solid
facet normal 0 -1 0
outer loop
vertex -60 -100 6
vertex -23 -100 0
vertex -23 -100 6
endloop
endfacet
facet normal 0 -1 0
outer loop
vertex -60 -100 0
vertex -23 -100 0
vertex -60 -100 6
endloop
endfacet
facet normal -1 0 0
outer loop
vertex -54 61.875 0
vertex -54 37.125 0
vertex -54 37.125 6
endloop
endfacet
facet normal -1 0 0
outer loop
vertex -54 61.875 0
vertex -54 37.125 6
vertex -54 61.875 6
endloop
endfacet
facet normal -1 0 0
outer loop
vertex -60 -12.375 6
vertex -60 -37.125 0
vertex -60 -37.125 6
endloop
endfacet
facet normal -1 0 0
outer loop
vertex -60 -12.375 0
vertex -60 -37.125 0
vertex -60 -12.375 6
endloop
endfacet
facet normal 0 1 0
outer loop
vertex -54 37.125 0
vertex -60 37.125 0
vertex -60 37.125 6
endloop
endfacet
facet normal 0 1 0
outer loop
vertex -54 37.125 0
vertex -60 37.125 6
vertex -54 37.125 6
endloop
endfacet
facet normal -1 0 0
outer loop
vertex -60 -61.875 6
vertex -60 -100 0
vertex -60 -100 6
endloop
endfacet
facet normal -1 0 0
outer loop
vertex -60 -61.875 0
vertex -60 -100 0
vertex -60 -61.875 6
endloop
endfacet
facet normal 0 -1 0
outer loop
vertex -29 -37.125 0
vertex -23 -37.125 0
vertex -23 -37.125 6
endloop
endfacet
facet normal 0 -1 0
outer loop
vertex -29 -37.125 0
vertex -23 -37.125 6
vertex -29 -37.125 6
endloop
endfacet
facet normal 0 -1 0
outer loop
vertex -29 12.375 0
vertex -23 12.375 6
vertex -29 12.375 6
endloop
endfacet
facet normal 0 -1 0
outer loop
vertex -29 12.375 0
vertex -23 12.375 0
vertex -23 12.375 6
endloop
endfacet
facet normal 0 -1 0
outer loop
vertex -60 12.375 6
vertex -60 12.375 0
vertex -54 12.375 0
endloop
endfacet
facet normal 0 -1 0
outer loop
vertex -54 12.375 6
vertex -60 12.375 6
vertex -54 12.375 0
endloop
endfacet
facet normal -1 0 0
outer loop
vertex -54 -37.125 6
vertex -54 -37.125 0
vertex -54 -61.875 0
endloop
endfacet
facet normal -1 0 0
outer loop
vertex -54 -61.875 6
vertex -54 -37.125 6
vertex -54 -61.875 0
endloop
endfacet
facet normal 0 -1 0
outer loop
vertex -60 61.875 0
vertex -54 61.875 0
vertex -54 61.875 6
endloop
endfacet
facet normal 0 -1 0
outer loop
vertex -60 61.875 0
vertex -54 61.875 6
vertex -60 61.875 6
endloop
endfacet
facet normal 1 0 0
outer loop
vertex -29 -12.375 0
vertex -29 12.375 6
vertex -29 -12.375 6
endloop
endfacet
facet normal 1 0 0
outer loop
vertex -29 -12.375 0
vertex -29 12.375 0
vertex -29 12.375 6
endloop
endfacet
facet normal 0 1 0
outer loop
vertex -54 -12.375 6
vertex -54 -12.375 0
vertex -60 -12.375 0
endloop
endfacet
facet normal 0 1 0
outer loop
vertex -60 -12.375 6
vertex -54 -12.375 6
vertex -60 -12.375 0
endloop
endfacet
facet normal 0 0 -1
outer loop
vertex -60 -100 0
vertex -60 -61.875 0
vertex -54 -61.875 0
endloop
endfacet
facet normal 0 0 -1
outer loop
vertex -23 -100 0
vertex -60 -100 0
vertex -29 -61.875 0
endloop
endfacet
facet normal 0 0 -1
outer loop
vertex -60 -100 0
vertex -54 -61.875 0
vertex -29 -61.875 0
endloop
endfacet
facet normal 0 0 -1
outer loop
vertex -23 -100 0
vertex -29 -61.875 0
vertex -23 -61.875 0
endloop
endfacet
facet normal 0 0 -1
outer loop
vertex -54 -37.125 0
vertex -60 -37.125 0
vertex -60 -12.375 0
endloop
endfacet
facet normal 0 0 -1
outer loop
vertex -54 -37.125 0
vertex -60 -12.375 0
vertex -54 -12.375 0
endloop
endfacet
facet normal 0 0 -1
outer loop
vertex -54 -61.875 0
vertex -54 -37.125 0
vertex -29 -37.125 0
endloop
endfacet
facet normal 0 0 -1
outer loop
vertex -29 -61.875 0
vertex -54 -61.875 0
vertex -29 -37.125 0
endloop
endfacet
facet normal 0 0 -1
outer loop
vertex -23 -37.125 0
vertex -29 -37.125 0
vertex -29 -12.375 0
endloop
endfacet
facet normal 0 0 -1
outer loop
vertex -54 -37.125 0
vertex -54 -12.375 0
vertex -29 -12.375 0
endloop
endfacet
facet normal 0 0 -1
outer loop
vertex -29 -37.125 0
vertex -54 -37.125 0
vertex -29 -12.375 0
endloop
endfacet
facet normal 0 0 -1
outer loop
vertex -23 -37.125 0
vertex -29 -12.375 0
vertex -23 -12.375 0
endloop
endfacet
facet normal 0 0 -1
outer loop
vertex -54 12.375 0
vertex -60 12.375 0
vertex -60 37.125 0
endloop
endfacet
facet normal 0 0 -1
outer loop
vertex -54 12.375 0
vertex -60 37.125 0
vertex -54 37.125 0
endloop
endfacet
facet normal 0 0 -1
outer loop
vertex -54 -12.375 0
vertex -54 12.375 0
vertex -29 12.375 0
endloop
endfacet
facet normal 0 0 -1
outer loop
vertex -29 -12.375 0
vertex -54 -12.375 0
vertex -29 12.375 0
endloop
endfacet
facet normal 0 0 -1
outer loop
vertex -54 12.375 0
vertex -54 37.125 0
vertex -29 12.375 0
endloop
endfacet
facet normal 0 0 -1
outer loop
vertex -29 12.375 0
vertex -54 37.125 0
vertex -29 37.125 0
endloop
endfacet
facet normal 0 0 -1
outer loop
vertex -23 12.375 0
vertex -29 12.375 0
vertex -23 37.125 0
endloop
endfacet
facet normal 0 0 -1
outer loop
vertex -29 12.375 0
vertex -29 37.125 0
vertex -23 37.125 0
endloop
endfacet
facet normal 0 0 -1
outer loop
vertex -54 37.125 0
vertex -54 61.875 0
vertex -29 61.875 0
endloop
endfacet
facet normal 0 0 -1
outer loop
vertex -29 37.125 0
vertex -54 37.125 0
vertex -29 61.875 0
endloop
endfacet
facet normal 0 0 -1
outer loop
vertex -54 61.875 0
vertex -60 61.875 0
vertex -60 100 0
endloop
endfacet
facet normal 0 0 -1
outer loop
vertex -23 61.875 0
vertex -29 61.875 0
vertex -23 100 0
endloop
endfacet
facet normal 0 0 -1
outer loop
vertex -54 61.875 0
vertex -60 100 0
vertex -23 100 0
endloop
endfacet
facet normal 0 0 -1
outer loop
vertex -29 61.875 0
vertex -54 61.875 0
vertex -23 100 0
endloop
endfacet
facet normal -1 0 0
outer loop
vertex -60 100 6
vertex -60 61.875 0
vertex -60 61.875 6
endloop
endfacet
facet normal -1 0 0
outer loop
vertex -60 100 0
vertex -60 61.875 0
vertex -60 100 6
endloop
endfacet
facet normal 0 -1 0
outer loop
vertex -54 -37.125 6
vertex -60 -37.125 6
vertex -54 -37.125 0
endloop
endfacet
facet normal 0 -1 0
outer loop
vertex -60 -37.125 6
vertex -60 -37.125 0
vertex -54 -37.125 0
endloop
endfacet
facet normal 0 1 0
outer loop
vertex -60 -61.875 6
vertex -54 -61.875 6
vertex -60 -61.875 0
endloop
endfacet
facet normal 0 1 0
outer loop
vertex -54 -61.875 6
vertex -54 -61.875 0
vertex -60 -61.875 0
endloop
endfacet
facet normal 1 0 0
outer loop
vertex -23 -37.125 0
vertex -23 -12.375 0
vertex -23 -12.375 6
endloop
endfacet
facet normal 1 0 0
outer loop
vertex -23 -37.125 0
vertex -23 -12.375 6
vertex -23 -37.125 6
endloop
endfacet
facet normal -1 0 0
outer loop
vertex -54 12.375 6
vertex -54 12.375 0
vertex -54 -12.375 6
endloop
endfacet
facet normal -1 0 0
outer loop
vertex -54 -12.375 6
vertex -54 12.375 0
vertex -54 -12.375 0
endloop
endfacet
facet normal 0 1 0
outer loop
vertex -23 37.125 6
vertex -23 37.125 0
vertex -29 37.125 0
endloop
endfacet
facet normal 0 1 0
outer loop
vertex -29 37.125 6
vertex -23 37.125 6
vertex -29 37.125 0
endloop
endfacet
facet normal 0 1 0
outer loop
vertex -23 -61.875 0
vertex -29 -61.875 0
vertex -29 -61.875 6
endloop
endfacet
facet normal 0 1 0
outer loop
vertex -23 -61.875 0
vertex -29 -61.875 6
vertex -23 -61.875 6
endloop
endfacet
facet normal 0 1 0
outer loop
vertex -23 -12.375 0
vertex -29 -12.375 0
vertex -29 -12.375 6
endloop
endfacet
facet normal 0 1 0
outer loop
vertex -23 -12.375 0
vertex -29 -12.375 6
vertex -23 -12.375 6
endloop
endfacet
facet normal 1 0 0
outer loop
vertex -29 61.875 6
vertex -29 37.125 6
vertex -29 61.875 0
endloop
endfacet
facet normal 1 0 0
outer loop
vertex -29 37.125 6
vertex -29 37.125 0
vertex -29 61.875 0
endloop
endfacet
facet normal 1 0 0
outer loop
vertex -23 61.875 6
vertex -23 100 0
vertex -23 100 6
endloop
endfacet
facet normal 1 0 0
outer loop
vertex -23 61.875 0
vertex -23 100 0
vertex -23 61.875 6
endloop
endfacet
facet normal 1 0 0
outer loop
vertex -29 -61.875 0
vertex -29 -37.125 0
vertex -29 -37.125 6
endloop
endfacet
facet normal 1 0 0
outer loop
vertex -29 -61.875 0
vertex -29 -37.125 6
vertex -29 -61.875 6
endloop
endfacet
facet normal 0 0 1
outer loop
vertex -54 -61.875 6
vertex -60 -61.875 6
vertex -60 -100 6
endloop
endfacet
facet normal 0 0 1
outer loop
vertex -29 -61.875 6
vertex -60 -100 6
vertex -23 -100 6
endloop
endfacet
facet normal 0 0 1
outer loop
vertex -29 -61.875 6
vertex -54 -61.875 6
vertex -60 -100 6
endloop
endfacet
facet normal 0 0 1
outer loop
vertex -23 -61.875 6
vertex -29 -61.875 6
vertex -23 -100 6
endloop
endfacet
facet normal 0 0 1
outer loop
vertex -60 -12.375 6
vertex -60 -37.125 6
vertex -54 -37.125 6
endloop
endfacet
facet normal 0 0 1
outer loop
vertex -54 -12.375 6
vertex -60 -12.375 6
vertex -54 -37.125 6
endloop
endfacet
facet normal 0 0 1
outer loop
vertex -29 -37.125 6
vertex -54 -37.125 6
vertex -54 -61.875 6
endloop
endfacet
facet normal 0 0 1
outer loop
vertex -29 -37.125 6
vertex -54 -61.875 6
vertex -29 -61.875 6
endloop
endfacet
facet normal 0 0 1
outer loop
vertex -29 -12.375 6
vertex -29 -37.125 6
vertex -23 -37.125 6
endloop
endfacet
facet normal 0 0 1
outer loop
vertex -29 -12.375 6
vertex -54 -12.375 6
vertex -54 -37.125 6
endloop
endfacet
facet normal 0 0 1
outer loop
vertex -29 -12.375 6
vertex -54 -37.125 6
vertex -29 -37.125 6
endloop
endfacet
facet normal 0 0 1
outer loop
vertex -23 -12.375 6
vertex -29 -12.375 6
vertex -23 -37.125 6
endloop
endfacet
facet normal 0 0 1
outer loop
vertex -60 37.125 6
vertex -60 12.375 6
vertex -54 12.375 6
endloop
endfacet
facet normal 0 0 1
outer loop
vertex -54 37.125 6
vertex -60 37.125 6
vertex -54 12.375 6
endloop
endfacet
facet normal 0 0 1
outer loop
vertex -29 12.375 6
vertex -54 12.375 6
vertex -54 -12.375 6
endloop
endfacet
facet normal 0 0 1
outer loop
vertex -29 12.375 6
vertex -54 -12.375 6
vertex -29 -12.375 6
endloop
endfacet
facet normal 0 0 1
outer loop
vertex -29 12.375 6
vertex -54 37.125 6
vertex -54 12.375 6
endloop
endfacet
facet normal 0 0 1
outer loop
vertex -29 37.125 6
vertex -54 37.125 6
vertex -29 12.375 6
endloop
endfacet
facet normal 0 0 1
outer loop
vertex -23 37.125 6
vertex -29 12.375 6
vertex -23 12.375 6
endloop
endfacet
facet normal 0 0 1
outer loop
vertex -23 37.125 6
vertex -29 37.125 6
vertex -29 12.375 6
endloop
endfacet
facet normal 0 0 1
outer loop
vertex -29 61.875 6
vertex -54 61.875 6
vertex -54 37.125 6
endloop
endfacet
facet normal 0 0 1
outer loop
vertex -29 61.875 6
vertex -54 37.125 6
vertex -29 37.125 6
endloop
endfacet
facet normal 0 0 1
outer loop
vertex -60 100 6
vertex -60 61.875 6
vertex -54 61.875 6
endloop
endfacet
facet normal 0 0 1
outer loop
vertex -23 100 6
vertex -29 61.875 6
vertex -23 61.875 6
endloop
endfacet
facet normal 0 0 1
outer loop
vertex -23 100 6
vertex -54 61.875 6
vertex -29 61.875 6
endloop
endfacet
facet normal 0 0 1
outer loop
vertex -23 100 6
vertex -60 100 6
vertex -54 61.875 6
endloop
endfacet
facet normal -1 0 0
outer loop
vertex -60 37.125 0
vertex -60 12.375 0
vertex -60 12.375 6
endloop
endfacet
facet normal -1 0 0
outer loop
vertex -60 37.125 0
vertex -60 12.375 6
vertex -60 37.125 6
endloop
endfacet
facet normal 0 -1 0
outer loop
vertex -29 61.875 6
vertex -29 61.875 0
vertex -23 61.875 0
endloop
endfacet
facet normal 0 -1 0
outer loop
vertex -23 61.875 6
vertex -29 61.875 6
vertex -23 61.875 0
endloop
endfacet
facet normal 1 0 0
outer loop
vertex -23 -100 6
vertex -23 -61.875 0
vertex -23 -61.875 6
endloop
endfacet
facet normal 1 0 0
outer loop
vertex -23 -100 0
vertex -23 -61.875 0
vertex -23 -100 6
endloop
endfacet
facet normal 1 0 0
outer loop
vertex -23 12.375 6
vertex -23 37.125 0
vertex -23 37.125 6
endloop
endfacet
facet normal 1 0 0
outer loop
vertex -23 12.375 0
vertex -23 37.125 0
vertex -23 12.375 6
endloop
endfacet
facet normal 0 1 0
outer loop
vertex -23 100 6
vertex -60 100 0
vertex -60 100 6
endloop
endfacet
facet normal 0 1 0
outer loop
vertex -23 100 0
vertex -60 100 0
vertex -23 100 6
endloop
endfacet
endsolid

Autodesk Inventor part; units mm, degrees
ref_plane "YZ Plane" through (0, 0, 0) normal (1, 0, 0) x (0, 1, 0)
ref_plane "XZ Plane" through (0, 0, 0) normal (0, 1, 0) x (-1, 0, 0)
ref_plane "XY Plane" through (0, 0, 0) normal (0, 0, 1) x (1, 0, 0)
sketch "Sketch1" plane through (0, 0, 0) normal (0, 0, 1) x (1, 0, 0)
  line L0 (-23, -100) -> (-60, -100)
  line L1 (-60, -100) -> (-60, 100)
  line L2 (-60, 100) -> (-23, 100)
  line L3 (-23, 100) -> (-23, -100)
  line L4 (-23, -100) -> (-60, 100) construction
  line L5 (-60, -100) -> (-23, 100) construction
  line L6 (-23, 0) -> (-23, 12.375)
  line L7 (-23, 12.375) -> (-29, 12.375)
  line L8 (-29, 12.375) -> (-29, -12.375)
  line L9 (-29, -12.375) -> (-23, -12.375)
  line L10 (-23, 12.375) -> (-23, 37.125)
  line L11 (-23, 37.125) -> (-29, 37.125)
  line L12 (-29, 37.125) -> (-29, 61.875)
  line L13 (-29, 61.875) -> (-23, 61.875)
  line L14 (-23, -12.375) -> (-23, -37.125)
  line L15 (-23, -37.125) -> (-29, -37.125)
  line L16 (-29, -37.125) -> (-29, -61.875)
  line L17 (-29, -61.875) -> (-23, -61.875)
  line L18 (-41.5, 0) -> (-41.5, 100)
  line L19 (-41.5, 0) -> (-25.6792, 0)
  line L20 (-60, 12.375) -> (-54, 12.375)
  line L21 (-54, 12.375) -> (-54, -12.375)
  line L22 (-54, -12.375) -> (-60, -12.375)
  line L23 (-60, 37.125) -> (-54, 37.125)
  line L24 (-54, 37.125) -> (-54, 61.875)
  line L25 (-54, 61.875) -> (-60, 61.875)
  line L26 (-60, -37.125) -> (-54, -37.125)
  line L27 (-54, -37.125) -> (-54, -61.875)
  line L28 (-54, -61.875) -> (-60, -61.875)
  dimension "d18" = 37
  dimension "d19" = 200
  dimension "d20" = 12.375
  dimension "d21" = 6
  dimension "d22" = 24.75
  dimension "d23" = 24.75
  dimension "d24" = 6
  dimension "d25" = 24.75
  dimension "d26" = 24.75
  dimension "d27" = 6
  dimension "d28" = 24.75
extrude "Extrusion1" add sketch "Sketch1" along normal blind 6 contours L0 L1 L28 L27 L26 L22 L21 L20 L23 L24 L25 L2 L18 L19 L8 L9 L3 L15 L16 L17 | L7 L8 L19 L18 L2 L3 L13 L12 L11
properties part number "Frontandback_2"
